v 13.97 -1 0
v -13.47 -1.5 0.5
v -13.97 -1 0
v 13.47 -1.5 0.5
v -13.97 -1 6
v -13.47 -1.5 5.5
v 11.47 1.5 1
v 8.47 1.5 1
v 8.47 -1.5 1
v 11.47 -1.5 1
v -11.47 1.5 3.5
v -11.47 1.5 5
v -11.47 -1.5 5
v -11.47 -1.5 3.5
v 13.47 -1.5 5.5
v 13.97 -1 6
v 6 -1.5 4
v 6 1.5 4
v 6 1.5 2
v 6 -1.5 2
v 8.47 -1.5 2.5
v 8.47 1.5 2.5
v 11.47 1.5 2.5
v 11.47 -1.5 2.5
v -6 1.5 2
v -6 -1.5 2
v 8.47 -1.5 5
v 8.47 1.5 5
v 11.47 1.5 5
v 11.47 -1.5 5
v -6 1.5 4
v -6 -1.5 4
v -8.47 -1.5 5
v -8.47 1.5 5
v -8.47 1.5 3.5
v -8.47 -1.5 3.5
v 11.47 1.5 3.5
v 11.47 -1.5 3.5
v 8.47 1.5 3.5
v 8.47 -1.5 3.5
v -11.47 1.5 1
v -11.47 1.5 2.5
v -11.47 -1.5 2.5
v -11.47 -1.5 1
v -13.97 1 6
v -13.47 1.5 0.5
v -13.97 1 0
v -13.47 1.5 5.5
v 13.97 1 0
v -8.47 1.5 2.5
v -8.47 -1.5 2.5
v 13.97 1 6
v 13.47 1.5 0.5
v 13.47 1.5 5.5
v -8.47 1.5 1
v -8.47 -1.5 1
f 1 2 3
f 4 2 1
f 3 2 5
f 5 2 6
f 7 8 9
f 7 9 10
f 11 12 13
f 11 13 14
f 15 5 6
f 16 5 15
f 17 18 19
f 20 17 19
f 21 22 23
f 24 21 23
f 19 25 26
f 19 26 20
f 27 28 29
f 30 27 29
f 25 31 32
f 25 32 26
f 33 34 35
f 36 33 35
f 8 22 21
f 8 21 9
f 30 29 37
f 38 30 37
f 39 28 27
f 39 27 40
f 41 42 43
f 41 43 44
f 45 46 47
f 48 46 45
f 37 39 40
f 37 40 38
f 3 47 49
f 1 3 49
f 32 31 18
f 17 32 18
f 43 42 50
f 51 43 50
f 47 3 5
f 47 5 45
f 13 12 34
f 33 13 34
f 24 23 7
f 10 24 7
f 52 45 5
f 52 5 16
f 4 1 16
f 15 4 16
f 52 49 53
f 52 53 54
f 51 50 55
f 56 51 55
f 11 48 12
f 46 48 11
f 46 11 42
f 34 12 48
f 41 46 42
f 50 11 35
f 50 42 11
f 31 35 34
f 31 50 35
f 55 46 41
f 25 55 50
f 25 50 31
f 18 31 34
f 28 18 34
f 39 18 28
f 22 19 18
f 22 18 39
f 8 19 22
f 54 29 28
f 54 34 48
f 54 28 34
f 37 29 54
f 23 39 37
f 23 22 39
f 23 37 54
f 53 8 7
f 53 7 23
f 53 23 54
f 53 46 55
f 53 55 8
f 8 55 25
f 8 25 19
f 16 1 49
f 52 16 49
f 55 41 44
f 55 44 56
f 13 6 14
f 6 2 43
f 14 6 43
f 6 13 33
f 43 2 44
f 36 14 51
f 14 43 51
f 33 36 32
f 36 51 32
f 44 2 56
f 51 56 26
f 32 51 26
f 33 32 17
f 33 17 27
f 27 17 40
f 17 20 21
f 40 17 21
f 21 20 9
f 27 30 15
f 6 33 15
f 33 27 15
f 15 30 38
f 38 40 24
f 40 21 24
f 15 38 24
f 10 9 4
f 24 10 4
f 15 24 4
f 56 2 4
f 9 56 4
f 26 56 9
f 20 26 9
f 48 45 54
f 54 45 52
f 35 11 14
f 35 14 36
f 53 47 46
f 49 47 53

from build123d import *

# Parameters (mm, degrees)
SKETCH_1_W          = 27.94
SKETCH_1_H          = 3
EXTRUDE_2_DEPTH     = 6
SKETCH_2_W          = 3
SKETCH_2_H          = 1.5
CUT_EXTRUDE_1_DEPTH = 6
CHAMFER_1_SIZE      = 0.5
CHAMFER_2_SIZE      = 0.5
SKETCH_3_W          = 12
SKETCH_3_H          = 2
CUT_EXTRUDE_2_DEPTH = 16.49712554


with BuildPart() as part:
    # Эскиз1 → Бобышка-Вытянуть2 (new body)
    with BuildSketch(Plane.XY):
        Rectangle(SKETCH_1_W, SKETCH_1_H)
    extrude(amount=EXTRUDE_2_DEPTH)

    # Эскиз2 → Вырез-Вытянуть1 (cut)
    with BuildSketch(Plane(origin=(0, 1.5, 0), x_dir=(1, 0, 0), z_dir=(0, 1, 0))):
        with Locations((-9.97, -1.75)):
            Rectangle(SKETCH_2_W, SKETCH_2_H)
        with Locations((-9.97, -4.25)):
            Rectangle(SKETCH_2_W, SKETCH_2_H)
        with Locations((9.97, -4.25)):
            Rectangle(SKETCH_2_W, SKETCH_2_H)
        with Locations((9.97, -1.75)):
            Rectangle(SKETCH_2_W, SKETCH_2_H)
    extrude(amount=-CUT_EXTRUDE_1_DEPTH, mode=Mode.SUBTRACT)

    # Фаска1
    chamfer_1_edges = [part.edges().sort_by_distance(p)[0] for p in [
        (0, 1.5, 0),
        (0, 1.5, 6),
        (-13.97, 1.5, 3),
        (13.97, 1.5, 3),
    ]]
    chamfer(chamfer_1_edges, length=CHAMFER_1_SIZE)

    # Фаска2
    chamfer_2_edges = [part.edges().sort_by_distance(p)[0] for p in [
        (0, -1.5, 6),
        (0, -1.5, 0),
        (13.97, -1.5, 3),
        (-13.97, -1.5, 3),
    ]]
    chamfer(chamfer_2_edges, length=CHAMFER_2_SIZE)

    # Эскиз3 → Вырез-Вытянуть2 (cut, through all)
    with BuildSketch(Plane(origin=(0, 1.5, 0), x_dir=(1, 0, 0), z_dir=(0, 1, 0))):
        with Locations((0, -3)):
            Rectangle(SKETCH_3_W, SKETCH_3_H)
    extrude(amount=-CUT_EXTRUDE_2_DEPTH, mode=Mode.SUBTRACT)


solid = part.part
